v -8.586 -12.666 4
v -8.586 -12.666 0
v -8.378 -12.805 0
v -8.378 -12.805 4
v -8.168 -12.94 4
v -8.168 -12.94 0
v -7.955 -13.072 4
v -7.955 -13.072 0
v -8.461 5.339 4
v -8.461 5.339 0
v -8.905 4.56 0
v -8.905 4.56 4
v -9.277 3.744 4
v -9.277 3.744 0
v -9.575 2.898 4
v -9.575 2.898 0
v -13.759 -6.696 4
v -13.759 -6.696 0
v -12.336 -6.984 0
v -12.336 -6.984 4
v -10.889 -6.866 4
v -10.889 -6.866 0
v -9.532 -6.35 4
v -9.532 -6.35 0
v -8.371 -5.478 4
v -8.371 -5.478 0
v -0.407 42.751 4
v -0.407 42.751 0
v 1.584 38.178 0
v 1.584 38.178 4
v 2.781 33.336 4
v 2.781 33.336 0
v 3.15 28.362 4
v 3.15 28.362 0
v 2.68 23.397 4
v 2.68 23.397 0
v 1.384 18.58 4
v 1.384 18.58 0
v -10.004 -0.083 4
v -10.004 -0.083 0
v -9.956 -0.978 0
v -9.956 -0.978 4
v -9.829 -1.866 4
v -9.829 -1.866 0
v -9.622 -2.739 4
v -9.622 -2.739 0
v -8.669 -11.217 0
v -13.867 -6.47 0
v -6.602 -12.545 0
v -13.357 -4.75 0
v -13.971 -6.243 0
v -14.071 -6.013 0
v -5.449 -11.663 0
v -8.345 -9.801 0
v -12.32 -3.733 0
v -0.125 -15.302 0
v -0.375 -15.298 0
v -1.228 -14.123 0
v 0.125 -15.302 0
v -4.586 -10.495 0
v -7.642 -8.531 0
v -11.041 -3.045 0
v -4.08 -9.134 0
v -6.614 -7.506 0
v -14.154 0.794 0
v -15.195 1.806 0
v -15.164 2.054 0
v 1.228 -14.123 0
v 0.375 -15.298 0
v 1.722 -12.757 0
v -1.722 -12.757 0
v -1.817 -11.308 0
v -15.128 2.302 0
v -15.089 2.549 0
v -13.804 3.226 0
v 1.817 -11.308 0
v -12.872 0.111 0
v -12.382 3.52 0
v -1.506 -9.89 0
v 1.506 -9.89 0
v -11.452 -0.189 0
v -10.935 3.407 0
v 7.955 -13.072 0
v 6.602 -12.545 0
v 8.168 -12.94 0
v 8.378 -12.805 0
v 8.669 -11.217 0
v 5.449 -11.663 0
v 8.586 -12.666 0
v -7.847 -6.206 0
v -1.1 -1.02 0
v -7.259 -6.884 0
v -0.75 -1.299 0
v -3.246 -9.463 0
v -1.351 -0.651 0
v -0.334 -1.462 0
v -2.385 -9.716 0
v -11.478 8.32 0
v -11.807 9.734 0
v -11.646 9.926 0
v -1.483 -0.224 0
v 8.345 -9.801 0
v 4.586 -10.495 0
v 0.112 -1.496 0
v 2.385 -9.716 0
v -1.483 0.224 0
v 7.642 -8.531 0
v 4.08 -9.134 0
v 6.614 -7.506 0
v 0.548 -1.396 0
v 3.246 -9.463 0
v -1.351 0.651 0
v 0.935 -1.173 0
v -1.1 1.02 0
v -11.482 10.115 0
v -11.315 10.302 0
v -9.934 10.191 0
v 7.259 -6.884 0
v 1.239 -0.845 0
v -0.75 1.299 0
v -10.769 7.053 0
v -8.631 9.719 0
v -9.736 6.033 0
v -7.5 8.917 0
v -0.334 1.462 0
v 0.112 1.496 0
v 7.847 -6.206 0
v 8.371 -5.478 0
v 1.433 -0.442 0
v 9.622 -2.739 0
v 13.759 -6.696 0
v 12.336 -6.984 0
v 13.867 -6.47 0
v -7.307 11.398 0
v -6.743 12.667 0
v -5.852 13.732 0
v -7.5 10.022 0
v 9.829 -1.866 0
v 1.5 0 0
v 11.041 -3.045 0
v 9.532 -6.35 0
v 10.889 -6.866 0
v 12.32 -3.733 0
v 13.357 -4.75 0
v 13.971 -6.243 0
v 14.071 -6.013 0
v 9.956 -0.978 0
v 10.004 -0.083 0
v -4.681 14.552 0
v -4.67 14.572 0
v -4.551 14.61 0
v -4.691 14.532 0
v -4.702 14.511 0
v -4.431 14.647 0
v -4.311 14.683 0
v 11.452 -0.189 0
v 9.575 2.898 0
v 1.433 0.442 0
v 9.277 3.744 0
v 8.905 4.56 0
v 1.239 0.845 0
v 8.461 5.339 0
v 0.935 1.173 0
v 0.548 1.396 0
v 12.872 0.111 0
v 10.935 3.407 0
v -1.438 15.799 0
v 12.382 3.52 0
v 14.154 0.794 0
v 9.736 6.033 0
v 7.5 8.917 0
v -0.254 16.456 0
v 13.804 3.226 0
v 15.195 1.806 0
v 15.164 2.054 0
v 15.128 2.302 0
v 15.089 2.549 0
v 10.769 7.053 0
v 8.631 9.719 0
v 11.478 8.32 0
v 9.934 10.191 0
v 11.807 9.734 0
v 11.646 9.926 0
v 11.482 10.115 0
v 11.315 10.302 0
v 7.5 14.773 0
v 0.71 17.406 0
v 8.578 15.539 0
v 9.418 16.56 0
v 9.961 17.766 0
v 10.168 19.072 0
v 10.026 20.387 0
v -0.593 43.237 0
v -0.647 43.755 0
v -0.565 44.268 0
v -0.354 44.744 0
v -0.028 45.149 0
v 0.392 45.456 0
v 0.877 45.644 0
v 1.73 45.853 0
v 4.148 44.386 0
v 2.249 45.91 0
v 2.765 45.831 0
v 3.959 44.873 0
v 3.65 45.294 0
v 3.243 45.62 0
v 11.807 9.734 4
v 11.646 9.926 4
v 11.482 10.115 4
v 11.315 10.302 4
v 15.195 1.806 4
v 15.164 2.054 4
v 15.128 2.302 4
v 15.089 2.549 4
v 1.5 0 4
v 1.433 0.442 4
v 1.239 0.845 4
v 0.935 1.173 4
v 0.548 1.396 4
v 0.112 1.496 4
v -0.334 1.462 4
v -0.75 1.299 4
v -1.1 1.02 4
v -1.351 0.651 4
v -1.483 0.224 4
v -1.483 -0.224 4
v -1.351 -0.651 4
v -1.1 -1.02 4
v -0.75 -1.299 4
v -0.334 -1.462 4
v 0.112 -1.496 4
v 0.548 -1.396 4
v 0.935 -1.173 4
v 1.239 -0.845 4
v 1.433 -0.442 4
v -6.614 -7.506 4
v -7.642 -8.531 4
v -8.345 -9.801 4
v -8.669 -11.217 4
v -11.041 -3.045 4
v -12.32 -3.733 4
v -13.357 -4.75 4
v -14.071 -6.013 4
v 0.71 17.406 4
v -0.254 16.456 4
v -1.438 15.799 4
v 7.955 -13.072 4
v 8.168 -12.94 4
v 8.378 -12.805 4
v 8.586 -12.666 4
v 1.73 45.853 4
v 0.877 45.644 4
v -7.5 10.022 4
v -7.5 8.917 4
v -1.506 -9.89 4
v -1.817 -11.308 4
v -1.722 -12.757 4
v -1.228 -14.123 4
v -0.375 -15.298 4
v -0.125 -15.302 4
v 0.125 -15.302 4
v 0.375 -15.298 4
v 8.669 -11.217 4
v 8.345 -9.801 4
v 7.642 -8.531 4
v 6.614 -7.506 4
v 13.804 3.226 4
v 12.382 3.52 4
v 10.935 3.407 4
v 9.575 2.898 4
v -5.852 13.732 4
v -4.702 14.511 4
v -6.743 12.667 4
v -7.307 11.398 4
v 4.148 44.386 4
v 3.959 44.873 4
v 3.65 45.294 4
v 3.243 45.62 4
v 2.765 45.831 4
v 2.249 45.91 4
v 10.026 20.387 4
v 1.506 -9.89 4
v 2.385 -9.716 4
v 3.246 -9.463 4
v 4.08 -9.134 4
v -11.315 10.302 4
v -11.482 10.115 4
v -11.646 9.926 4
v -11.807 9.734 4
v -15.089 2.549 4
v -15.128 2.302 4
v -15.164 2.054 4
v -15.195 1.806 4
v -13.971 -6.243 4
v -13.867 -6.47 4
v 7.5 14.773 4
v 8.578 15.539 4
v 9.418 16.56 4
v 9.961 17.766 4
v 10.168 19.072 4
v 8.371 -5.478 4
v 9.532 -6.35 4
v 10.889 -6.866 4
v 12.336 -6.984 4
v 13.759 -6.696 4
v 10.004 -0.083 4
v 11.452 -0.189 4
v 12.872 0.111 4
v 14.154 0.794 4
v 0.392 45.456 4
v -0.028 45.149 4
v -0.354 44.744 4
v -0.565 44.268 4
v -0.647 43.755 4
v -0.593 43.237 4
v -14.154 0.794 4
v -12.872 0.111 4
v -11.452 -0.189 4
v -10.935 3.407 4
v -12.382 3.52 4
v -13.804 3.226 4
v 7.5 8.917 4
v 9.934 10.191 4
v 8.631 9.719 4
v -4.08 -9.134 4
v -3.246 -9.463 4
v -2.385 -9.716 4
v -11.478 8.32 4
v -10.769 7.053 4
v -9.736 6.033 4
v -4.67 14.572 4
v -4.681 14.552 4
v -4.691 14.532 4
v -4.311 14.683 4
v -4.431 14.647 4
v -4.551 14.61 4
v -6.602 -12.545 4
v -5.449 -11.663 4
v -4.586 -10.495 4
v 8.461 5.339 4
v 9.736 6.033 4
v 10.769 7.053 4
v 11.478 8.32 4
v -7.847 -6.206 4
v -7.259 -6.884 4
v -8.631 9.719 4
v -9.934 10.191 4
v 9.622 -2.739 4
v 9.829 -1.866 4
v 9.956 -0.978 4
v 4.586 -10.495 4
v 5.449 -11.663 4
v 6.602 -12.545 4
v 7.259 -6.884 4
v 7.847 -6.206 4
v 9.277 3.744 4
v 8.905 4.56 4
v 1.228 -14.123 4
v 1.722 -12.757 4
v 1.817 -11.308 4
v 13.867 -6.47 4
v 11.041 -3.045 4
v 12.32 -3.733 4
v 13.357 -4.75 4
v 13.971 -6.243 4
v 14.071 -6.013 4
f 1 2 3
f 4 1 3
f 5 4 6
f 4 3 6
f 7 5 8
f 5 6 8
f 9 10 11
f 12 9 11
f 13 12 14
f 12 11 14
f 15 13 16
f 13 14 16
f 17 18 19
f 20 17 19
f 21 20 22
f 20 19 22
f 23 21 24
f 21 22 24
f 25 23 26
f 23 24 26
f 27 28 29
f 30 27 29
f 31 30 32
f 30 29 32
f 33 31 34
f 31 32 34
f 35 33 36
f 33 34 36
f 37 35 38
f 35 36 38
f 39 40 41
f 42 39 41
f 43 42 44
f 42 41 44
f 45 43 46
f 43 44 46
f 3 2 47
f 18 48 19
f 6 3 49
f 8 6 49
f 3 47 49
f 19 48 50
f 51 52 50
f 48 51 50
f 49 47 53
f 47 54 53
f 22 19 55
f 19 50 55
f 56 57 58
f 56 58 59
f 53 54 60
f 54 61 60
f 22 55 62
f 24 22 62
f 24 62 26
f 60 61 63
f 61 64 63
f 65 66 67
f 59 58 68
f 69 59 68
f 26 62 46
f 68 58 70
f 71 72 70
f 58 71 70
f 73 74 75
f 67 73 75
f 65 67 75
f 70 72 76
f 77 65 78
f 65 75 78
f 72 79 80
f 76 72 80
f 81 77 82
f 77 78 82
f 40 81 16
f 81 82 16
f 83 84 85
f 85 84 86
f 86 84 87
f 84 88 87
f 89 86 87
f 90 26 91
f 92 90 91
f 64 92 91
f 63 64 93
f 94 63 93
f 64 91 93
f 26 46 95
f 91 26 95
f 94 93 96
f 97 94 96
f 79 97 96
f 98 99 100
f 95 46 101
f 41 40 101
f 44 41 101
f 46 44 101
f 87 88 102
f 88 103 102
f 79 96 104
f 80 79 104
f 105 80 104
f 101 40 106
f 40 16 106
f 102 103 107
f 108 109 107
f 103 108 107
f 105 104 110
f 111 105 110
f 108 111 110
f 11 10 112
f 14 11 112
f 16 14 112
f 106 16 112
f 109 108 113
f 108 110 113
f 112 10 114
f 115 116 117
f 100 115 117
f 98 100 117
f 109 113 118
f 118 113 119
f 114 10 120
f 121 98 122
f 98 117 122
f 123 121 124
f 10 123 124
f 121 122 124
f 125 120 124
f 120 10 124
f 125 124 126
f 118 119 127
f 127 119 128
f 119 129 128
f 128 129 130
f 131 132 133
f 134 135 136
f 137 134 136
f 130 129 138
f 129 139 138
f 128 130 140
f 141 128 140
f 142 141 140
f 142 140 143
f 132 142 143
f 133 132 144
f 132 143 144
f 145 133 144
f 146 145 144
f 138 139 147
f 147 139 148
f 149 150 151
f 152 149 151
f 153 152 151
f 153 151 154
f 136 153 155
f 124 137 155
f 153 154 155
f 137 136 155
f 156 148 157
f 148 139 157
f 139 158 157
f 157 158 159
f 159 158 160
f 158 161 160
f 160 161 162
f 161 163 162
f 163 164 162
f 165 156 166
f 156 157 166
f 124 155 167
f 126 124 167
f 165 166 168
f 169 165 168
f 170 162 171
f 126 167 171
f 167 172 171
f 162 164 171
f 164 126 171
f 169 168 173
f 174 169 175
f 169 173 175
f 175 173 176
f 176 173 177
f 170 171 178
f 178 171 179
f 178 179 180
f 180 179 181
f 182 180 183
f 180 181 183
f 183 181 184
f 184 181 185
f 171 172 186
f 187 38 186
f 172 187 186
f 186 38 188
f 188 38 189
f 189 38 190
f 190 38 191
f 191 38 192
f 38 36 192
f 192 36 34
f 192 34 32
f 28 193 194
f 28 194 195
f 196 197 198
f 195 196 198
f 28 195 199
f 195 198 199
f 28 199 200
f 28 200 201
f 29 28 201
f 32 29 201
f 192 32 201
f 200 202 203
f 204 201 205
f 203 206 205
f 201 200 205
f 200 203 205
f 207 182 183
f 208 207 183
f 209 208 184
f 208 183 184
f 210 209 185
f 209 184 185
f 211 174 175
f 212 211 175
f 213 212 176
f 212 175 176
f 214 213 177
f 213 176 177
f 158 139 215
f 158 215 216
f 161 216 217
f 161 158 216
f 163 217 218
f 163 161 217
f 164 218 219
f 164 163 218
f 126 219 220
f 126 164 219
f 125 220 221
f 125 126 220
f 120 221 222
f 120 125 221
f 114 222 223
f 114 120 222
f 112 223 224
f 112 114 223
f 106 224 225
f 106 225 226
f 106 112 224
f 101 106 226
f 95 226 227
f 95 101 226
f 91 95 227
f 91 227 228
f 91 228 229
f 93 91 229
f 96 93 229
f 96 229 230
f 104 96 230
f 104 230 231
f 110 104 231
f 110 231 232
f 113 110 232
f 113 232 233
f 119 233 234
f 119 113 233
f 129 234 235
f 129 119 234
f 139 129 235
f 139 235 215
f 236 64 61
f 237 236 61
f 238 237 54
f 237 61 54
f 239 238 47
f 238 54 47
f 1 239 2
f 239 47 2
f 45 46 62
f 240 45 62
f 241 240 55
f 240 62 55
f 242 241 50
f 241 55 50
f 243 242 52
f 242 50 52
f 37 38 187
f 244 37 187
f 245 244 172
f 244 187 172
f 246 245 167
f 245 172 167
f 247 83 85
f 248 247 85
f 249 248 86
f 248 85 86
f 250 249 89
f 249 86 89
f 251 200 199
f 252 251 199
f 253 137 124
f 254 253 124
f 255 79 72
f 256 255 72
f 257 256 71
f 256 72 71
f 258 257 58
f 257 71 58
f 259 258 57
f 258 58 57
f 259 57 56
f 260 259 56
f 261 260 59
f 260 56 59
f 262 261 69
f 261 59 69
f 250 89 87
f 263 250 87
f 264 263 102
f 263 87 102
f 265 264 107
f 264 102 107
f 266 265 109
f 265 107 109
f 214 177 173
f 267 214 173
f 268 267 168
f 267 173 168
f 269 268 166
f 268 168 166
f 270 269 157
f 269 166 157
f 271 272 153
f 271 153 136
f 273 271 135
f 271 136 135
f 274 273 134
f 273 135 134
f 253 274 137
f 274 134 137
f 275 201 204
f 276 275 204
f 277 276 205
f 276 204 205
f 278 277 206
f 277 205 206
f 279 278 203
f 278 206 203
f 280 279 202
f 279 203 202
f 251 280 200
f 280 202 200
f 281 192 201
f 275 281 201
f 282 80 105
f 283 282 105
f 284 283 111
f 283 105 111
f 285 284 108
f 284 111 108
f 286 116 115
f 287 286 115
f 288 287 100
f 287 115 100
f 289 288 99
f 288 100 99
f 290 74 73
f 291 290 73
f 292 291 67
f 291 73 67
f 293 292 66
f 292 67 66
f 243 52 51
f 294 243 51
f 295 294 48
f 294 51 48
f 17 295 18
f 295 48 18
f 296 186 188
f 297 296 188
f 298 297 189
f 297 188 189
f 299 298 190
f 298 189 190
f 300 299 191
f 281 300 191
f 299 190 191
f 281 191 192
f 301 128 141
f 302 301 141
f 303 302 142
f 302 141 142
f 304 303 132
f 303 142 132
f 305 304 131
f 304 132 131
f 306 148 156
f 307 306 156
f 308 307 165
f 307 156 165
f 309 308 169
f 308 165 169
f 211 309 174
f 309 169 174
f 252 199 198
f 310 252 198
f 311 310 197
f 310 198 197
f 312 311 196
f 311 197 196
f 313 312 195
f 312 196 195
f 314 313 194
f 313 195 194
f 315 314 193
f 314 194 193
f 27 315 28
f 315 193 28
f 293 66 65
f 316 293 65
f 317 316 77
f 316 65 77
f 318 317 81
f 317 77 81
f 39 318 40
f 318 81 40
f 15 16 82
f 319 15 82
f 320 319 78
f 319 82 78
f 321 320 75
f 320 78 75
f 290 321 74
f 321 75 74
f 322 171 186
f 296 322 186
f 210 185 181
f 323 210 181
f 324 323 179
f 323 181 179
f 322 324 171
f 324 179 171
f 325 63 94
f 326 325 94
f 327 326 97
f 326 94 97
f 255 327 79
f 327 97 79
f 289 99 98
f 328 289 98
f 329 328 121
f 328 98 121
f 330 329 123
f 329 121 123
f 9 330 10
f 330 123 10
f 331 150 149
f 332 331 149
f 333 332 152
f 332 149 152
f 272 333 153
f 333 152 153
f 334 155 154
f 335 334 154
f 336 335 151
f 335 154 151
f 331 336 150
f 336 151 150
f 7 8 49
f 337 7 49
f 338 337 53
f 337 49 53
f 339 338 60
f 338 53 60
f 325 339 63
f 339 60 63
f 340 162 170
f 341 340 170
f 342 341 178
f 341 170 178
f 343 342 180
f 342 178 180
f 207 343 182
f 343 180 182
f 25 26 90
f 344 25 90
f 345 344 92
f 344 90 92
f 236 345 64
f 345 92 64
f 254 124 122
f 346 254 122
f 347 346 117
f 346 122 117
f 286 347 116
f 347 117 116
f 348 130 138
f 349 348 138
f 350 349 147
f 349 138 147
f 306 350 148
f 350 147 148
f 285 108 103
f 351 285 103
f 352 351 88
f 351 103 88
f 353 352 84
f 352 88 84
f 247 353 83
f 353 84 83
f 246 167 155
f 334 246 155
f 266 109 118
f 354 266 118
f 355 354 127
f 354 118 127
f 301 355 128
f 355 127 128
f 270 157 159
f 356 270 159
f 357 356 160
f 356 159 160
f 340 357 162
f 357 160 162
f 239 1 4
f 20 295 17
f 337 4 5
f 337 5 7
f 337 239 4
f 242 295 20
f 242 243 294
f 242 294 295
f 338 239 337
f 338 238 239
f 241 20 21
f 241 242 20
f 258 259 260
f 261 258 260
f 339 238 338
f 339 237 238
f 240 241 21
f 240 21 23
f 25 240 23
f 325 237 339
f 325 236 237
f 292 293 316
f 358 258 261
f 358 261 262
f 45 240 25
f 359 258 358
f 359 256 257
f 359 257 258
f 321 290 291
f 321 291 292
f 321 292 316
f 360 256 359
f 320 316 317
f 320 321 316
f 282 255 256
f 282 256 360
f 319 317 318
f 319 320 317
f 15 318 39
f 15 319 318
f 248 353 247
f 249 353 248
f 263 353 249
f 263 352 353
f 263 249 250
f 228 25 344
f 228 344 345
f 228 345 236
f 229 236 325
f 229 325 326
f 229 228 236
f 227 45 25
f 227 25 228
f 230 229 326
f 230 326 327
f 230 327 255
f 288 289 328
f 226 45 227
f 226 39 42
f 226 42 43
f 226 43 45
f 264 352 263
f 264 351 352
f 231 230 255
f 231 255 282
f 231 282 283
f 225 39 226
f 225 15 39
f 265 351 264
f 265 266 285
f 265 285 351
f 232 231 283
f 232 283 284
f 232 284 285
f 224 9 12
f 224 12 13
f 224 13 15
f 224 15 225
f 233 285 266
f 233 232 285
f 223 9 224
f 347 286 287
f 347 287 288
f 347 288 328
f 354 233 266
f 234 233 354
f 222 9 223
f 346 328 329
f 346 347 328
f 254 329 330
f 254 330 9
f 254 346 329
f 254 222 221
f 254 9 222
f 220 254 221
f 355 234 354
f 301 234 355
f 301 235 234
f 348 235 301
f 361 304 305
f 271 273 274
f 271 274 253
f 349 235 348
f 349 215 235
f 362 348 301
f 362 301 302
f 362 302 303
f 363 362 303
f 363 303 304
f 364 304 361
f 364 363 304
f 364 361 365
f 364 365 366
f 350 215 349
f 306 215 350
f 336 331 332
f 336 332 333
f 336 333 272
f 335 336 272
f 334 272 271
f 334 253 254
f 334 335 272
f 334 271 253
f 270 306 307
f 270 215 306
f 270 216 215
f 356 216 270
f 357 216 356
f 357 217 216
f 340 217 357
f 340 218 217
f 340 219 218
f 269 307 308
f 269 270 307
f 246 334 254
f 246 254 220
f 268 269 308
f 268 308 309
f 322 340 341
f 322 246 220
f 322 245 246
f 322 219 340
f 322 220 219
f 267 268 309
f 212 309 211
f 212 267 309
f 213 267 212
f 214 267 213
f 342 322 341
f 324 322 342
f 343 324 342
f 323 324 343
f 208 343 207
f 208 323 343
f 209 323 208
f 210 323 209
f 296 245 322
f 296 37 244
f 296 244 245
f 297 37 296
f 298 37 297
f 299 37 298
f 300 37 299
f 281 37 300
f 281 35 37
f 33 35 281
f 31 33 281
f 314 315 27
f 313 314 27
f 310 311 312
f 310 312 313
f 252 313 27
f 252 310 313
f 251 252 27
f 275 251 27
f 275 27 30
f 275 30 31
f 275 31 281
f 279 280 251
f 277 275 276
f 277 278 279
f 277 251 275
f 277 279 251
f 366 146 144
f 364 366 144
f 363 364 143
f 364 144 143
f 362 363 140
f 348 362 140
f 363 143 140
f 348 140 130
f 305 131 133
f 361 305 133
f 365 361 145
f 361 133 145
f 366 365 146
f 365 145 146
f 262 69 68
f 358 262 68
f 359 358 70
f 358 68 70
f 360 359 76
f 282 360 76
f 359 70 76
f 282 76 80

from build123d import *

# Parameters (mm, degrees)
SKETCH_1_R      = 1.5
EXTRUDE_1_DEPTH = 4
EXTRUDE_START   = -4
SKETCH_2_R      = 1.5
EXTRUDE_2_DEPTH = 4


with BuildPart() as part:
    # Эскиз1 → Бобышка-Вытянуть1 (new body)
    with BuildSketch(Plane.XY):
        with BuildLine():
            ThreePointArc((14.071260881, -6.013492872), (12.319653053, -3.733490841), (9.621977893, -2.738961818))
            ThreePointArc((9.621977893, -2.738961818), (9.902389121, -1.423748614), (10.003874897, -0.082809815))
            ThreePointArc((10.003874897, -0.082809815), (12.872466462, 0.111410875), (15.195472667, 1.805571852))
            ThreePointArc((15.195472667, 1.805571852), (15.146612375, 2.177754087), (15.088637629, 2.548625862))
            ThreePointArc((15.088637629, 2.548625862), (12.382429194, 3.519694937), (9.575317452, 2.897872688))
            ThreePointArc((9.575317452, 2.897872688), (9.100156446, 4.155902197), (8.460565465, 5.338839053))
            ThreePointArc((8.460565465, 5.338839053), (10.768774621, 7.053105583), (11.807079223, 9.734236463))
            ThreePointArc((11.807079223, 9.734236463), (11.564758421, 10.020920215), (11.315478542, 10.301573893))
            ThreePointArc((11.315478542, 10.301573893), (8.513871556, 9.655402442), (6.488561375, 7.614653091))
            ThreePointArc((6.488561375, 7.614653091), (5.408688398, 8.416083426), (4.231086277, 9.065444244))
            ThreePointArc((4.231086277, 9.065444244), (5.246072926, 11.755489103), (4.67002155, 14.572349777))
            ThreePointArc((4.67002155, 14.572349777), (4.311175381, 14.68251498), (3.949734969, 14.783845))
            ThreePointArc((3.949734969, 14.783845), (1.942219856, 12.725587893), (1.341732908, 9.91383494))
            ThreePointArc((1.341732908, 9.91383494), (0, 10.004217632), (-1.341732908, 9.91383494))
            ThreePointArc((-1.341732908, 9.91383494), (-1.942219856, 12.725587893), (-3.949734969, 14.783845))
            ThreePointArc((-3.949734969, 14.783845), (-4.311175381, 14.68251498), (-4.67002155, 14.572349777))
            ThreePointArc((-4.67002155, 14.572349777), (-5.246072926, 11.755489103), (-4.231086277, 9.065444244))
            ThreePointArc((-4.231086277, 9.065444244), (-5.408688398, 8.416083426), (-6.488561375, 7.614653091))
            ThreePointArc((-6.488561375, 7.614653091), (-8.513871556, 9.655402442), (-11.315478542, 10.301573893))
            ThreePointArc((-11.315478542, 10.301573893), (-11.564758421, 10.020920215), (-11.807079223, 9.734236463))
            ThreePointArc((-11.807079223, 9.734236463), (-10.768774621, 7.053105583), (-8.460565465, 5.338839053))
            ThreePointArc((-8.460565465, 5.338839053), (-9.100156446, 4.155902197), (-9.575317452, 2.897872688))
            ThreePointArc((-9.575317452, 2.897872688), (-12.382429194, 3.519694937), (-15.088637629, 2.548625862))
            ThreePointArc((-15.088637629, 2.548625862), (-15.146612375, 2.177754087), (-15.195472667, 1.805571852))
            ThreePointArc((-15.195472667, 1.805571852), (-12.872466462, 0.111410875), (-10.003874897, -0.082809815))
            ThreePointArc((-10.003874897, -0.082809815), (-9.902389121, -1.423748614), (-9.621977893, -2.738961818))
            ThreePointArc((-9.621977893, -2.738961818), (-12.319653053, -3.733490841), (-14.071260881, -6.013492872))
            ThreePointArc((-14.071260881, -6.013492872), (-13.91952392, -6.356833577), (-13.759410906, -6.696349066))
            ThreePointArc((-13.759410906, -6.696349066), (-10.889241154, -6.865655999), (-8.371024733, -5.478167151))
            ThreePointArc((-8.371024733, -5.478167151), (-7.560683217, -6.551369301), (-6.613728339, -7.506195299))
            ThreePointArc((-6.613728339, -7.506195299), (-8.345474114, -9.801319657), (-8.586358225, -12.666370108))
            ThreePointArc((-8.586358225, -12.666370108), (-8.273084972, -12.873171495), (-7.954833402, -13.072226469))
            ThreePointArc((-7.954833402, -13.072226469), (-5.448758719, -11.662925603), (-4.080433364, -9.134245124))
            ThreePointArc((-4.080433364, -9.134245124), (-2.818513813, -9.598976524), (-1.505666768, -9.89026481))
            ThreePointArc((-1.505666768, -9.89026481), (-1.72166611, -12.757298735), (-0.375347502, -15.297764332))
            ThreePointArc((-0.375347502, -15.297764332), (0, -15.302368421), (0.375347502, -15.297764332))
            ThreePointArc((0.375347502, -15.297764332), (1.72166611, -12.757298735), (1.505666768, -9.89026481))
            ThreePointArc((1.505666768, -9.89026481), (2.818513813, -9.598976524), (4.080433364, -9.134245124))
            ThreePointArc((4.080433364, -9.134245124), (5.448758719, -11.662925603), (7.954833402, -13.072226469))
            ThreePointArc((7.954833402, -13.072226469), (8.273084972, -12.873171495), (8.586358225, -12.666370108))
            ThreePointArc((8.586358225, -12.666370108), (8.345474114, -9.801319657), (6.613728339, -7.506195299))
            ThreePointArc((6.613728339, -7.506195299), (7.560683217, -6.551369301), (8.371024733, -5.478167151))
            ThreePointArc((8.371024733, -5.478167151), (10.889241154, -6.865655999), (13.759410906, -6.696349066))
            ThreePointArc((13.759410906, -6.696349066), (13.91952392, -6.356833577), (14.071260881, -6.013492872))
        make_face()
        Circle(SKETCH_1_R, mode=Mode.SUBTRACT)
    extrude(amount=EXTRUDE_1_DEPTH)

    # Эскиз2 → Бобышка-Вытянуть2 (add)
    with BuildSketch(Plane.XY.offset(4).offset(EXTRUDE_START)):
        with BuildLine():
            Line((-7.5, 10.022081122), (-7.5, 0))
            ThreePointArc((-7.5, 0), (0, -7.5), (7.5, 0))
            Line((7.5, 0), (7.5, 14.773393999))
            ThreePointArc((7.5, 14.773393999), (9.729229581, 17.145166049), (10.026172222, 20.386553445))
            Line((10.026172222, 20.386553445), (4.148462459, 44.386107165))
            ThreePointArc((4.148462459, 44.386107165), (3.243079479, 45.620379181), (1.730114922, 45.852938848))
            Line((1.730114922, 45.852938848), (0.876935531, 45.643987428))
            ThreePointArc((0.876935531, 45.643987428), (-0.475250292, 44.512952898), (-0.407285774, 42.751411973))
            ThreePointArc((-0.407285774, 42.751411973), (3.070511892, 30.857094407), (1.383888162, 18.580076554))
            ThreePointArc((1.383888162, 18.580076554), (0.260030802, 16.89805568), (-1.438297092, 15.798996103))
            Line((-1.438297092, 15.798996103), (-4.311175381, 14.68251498))
            ThreePointArc((-4.311175381, 14.68251498), (-6.62649227, 12.84556506), (-7.5, 10.022081122))
        make_face()
        Circle(SKETCH_2_R, mode=Mode.SUBTRACT)
    extrude(amount=EXTRUDE_2_DEPTH)


solid = part.part
